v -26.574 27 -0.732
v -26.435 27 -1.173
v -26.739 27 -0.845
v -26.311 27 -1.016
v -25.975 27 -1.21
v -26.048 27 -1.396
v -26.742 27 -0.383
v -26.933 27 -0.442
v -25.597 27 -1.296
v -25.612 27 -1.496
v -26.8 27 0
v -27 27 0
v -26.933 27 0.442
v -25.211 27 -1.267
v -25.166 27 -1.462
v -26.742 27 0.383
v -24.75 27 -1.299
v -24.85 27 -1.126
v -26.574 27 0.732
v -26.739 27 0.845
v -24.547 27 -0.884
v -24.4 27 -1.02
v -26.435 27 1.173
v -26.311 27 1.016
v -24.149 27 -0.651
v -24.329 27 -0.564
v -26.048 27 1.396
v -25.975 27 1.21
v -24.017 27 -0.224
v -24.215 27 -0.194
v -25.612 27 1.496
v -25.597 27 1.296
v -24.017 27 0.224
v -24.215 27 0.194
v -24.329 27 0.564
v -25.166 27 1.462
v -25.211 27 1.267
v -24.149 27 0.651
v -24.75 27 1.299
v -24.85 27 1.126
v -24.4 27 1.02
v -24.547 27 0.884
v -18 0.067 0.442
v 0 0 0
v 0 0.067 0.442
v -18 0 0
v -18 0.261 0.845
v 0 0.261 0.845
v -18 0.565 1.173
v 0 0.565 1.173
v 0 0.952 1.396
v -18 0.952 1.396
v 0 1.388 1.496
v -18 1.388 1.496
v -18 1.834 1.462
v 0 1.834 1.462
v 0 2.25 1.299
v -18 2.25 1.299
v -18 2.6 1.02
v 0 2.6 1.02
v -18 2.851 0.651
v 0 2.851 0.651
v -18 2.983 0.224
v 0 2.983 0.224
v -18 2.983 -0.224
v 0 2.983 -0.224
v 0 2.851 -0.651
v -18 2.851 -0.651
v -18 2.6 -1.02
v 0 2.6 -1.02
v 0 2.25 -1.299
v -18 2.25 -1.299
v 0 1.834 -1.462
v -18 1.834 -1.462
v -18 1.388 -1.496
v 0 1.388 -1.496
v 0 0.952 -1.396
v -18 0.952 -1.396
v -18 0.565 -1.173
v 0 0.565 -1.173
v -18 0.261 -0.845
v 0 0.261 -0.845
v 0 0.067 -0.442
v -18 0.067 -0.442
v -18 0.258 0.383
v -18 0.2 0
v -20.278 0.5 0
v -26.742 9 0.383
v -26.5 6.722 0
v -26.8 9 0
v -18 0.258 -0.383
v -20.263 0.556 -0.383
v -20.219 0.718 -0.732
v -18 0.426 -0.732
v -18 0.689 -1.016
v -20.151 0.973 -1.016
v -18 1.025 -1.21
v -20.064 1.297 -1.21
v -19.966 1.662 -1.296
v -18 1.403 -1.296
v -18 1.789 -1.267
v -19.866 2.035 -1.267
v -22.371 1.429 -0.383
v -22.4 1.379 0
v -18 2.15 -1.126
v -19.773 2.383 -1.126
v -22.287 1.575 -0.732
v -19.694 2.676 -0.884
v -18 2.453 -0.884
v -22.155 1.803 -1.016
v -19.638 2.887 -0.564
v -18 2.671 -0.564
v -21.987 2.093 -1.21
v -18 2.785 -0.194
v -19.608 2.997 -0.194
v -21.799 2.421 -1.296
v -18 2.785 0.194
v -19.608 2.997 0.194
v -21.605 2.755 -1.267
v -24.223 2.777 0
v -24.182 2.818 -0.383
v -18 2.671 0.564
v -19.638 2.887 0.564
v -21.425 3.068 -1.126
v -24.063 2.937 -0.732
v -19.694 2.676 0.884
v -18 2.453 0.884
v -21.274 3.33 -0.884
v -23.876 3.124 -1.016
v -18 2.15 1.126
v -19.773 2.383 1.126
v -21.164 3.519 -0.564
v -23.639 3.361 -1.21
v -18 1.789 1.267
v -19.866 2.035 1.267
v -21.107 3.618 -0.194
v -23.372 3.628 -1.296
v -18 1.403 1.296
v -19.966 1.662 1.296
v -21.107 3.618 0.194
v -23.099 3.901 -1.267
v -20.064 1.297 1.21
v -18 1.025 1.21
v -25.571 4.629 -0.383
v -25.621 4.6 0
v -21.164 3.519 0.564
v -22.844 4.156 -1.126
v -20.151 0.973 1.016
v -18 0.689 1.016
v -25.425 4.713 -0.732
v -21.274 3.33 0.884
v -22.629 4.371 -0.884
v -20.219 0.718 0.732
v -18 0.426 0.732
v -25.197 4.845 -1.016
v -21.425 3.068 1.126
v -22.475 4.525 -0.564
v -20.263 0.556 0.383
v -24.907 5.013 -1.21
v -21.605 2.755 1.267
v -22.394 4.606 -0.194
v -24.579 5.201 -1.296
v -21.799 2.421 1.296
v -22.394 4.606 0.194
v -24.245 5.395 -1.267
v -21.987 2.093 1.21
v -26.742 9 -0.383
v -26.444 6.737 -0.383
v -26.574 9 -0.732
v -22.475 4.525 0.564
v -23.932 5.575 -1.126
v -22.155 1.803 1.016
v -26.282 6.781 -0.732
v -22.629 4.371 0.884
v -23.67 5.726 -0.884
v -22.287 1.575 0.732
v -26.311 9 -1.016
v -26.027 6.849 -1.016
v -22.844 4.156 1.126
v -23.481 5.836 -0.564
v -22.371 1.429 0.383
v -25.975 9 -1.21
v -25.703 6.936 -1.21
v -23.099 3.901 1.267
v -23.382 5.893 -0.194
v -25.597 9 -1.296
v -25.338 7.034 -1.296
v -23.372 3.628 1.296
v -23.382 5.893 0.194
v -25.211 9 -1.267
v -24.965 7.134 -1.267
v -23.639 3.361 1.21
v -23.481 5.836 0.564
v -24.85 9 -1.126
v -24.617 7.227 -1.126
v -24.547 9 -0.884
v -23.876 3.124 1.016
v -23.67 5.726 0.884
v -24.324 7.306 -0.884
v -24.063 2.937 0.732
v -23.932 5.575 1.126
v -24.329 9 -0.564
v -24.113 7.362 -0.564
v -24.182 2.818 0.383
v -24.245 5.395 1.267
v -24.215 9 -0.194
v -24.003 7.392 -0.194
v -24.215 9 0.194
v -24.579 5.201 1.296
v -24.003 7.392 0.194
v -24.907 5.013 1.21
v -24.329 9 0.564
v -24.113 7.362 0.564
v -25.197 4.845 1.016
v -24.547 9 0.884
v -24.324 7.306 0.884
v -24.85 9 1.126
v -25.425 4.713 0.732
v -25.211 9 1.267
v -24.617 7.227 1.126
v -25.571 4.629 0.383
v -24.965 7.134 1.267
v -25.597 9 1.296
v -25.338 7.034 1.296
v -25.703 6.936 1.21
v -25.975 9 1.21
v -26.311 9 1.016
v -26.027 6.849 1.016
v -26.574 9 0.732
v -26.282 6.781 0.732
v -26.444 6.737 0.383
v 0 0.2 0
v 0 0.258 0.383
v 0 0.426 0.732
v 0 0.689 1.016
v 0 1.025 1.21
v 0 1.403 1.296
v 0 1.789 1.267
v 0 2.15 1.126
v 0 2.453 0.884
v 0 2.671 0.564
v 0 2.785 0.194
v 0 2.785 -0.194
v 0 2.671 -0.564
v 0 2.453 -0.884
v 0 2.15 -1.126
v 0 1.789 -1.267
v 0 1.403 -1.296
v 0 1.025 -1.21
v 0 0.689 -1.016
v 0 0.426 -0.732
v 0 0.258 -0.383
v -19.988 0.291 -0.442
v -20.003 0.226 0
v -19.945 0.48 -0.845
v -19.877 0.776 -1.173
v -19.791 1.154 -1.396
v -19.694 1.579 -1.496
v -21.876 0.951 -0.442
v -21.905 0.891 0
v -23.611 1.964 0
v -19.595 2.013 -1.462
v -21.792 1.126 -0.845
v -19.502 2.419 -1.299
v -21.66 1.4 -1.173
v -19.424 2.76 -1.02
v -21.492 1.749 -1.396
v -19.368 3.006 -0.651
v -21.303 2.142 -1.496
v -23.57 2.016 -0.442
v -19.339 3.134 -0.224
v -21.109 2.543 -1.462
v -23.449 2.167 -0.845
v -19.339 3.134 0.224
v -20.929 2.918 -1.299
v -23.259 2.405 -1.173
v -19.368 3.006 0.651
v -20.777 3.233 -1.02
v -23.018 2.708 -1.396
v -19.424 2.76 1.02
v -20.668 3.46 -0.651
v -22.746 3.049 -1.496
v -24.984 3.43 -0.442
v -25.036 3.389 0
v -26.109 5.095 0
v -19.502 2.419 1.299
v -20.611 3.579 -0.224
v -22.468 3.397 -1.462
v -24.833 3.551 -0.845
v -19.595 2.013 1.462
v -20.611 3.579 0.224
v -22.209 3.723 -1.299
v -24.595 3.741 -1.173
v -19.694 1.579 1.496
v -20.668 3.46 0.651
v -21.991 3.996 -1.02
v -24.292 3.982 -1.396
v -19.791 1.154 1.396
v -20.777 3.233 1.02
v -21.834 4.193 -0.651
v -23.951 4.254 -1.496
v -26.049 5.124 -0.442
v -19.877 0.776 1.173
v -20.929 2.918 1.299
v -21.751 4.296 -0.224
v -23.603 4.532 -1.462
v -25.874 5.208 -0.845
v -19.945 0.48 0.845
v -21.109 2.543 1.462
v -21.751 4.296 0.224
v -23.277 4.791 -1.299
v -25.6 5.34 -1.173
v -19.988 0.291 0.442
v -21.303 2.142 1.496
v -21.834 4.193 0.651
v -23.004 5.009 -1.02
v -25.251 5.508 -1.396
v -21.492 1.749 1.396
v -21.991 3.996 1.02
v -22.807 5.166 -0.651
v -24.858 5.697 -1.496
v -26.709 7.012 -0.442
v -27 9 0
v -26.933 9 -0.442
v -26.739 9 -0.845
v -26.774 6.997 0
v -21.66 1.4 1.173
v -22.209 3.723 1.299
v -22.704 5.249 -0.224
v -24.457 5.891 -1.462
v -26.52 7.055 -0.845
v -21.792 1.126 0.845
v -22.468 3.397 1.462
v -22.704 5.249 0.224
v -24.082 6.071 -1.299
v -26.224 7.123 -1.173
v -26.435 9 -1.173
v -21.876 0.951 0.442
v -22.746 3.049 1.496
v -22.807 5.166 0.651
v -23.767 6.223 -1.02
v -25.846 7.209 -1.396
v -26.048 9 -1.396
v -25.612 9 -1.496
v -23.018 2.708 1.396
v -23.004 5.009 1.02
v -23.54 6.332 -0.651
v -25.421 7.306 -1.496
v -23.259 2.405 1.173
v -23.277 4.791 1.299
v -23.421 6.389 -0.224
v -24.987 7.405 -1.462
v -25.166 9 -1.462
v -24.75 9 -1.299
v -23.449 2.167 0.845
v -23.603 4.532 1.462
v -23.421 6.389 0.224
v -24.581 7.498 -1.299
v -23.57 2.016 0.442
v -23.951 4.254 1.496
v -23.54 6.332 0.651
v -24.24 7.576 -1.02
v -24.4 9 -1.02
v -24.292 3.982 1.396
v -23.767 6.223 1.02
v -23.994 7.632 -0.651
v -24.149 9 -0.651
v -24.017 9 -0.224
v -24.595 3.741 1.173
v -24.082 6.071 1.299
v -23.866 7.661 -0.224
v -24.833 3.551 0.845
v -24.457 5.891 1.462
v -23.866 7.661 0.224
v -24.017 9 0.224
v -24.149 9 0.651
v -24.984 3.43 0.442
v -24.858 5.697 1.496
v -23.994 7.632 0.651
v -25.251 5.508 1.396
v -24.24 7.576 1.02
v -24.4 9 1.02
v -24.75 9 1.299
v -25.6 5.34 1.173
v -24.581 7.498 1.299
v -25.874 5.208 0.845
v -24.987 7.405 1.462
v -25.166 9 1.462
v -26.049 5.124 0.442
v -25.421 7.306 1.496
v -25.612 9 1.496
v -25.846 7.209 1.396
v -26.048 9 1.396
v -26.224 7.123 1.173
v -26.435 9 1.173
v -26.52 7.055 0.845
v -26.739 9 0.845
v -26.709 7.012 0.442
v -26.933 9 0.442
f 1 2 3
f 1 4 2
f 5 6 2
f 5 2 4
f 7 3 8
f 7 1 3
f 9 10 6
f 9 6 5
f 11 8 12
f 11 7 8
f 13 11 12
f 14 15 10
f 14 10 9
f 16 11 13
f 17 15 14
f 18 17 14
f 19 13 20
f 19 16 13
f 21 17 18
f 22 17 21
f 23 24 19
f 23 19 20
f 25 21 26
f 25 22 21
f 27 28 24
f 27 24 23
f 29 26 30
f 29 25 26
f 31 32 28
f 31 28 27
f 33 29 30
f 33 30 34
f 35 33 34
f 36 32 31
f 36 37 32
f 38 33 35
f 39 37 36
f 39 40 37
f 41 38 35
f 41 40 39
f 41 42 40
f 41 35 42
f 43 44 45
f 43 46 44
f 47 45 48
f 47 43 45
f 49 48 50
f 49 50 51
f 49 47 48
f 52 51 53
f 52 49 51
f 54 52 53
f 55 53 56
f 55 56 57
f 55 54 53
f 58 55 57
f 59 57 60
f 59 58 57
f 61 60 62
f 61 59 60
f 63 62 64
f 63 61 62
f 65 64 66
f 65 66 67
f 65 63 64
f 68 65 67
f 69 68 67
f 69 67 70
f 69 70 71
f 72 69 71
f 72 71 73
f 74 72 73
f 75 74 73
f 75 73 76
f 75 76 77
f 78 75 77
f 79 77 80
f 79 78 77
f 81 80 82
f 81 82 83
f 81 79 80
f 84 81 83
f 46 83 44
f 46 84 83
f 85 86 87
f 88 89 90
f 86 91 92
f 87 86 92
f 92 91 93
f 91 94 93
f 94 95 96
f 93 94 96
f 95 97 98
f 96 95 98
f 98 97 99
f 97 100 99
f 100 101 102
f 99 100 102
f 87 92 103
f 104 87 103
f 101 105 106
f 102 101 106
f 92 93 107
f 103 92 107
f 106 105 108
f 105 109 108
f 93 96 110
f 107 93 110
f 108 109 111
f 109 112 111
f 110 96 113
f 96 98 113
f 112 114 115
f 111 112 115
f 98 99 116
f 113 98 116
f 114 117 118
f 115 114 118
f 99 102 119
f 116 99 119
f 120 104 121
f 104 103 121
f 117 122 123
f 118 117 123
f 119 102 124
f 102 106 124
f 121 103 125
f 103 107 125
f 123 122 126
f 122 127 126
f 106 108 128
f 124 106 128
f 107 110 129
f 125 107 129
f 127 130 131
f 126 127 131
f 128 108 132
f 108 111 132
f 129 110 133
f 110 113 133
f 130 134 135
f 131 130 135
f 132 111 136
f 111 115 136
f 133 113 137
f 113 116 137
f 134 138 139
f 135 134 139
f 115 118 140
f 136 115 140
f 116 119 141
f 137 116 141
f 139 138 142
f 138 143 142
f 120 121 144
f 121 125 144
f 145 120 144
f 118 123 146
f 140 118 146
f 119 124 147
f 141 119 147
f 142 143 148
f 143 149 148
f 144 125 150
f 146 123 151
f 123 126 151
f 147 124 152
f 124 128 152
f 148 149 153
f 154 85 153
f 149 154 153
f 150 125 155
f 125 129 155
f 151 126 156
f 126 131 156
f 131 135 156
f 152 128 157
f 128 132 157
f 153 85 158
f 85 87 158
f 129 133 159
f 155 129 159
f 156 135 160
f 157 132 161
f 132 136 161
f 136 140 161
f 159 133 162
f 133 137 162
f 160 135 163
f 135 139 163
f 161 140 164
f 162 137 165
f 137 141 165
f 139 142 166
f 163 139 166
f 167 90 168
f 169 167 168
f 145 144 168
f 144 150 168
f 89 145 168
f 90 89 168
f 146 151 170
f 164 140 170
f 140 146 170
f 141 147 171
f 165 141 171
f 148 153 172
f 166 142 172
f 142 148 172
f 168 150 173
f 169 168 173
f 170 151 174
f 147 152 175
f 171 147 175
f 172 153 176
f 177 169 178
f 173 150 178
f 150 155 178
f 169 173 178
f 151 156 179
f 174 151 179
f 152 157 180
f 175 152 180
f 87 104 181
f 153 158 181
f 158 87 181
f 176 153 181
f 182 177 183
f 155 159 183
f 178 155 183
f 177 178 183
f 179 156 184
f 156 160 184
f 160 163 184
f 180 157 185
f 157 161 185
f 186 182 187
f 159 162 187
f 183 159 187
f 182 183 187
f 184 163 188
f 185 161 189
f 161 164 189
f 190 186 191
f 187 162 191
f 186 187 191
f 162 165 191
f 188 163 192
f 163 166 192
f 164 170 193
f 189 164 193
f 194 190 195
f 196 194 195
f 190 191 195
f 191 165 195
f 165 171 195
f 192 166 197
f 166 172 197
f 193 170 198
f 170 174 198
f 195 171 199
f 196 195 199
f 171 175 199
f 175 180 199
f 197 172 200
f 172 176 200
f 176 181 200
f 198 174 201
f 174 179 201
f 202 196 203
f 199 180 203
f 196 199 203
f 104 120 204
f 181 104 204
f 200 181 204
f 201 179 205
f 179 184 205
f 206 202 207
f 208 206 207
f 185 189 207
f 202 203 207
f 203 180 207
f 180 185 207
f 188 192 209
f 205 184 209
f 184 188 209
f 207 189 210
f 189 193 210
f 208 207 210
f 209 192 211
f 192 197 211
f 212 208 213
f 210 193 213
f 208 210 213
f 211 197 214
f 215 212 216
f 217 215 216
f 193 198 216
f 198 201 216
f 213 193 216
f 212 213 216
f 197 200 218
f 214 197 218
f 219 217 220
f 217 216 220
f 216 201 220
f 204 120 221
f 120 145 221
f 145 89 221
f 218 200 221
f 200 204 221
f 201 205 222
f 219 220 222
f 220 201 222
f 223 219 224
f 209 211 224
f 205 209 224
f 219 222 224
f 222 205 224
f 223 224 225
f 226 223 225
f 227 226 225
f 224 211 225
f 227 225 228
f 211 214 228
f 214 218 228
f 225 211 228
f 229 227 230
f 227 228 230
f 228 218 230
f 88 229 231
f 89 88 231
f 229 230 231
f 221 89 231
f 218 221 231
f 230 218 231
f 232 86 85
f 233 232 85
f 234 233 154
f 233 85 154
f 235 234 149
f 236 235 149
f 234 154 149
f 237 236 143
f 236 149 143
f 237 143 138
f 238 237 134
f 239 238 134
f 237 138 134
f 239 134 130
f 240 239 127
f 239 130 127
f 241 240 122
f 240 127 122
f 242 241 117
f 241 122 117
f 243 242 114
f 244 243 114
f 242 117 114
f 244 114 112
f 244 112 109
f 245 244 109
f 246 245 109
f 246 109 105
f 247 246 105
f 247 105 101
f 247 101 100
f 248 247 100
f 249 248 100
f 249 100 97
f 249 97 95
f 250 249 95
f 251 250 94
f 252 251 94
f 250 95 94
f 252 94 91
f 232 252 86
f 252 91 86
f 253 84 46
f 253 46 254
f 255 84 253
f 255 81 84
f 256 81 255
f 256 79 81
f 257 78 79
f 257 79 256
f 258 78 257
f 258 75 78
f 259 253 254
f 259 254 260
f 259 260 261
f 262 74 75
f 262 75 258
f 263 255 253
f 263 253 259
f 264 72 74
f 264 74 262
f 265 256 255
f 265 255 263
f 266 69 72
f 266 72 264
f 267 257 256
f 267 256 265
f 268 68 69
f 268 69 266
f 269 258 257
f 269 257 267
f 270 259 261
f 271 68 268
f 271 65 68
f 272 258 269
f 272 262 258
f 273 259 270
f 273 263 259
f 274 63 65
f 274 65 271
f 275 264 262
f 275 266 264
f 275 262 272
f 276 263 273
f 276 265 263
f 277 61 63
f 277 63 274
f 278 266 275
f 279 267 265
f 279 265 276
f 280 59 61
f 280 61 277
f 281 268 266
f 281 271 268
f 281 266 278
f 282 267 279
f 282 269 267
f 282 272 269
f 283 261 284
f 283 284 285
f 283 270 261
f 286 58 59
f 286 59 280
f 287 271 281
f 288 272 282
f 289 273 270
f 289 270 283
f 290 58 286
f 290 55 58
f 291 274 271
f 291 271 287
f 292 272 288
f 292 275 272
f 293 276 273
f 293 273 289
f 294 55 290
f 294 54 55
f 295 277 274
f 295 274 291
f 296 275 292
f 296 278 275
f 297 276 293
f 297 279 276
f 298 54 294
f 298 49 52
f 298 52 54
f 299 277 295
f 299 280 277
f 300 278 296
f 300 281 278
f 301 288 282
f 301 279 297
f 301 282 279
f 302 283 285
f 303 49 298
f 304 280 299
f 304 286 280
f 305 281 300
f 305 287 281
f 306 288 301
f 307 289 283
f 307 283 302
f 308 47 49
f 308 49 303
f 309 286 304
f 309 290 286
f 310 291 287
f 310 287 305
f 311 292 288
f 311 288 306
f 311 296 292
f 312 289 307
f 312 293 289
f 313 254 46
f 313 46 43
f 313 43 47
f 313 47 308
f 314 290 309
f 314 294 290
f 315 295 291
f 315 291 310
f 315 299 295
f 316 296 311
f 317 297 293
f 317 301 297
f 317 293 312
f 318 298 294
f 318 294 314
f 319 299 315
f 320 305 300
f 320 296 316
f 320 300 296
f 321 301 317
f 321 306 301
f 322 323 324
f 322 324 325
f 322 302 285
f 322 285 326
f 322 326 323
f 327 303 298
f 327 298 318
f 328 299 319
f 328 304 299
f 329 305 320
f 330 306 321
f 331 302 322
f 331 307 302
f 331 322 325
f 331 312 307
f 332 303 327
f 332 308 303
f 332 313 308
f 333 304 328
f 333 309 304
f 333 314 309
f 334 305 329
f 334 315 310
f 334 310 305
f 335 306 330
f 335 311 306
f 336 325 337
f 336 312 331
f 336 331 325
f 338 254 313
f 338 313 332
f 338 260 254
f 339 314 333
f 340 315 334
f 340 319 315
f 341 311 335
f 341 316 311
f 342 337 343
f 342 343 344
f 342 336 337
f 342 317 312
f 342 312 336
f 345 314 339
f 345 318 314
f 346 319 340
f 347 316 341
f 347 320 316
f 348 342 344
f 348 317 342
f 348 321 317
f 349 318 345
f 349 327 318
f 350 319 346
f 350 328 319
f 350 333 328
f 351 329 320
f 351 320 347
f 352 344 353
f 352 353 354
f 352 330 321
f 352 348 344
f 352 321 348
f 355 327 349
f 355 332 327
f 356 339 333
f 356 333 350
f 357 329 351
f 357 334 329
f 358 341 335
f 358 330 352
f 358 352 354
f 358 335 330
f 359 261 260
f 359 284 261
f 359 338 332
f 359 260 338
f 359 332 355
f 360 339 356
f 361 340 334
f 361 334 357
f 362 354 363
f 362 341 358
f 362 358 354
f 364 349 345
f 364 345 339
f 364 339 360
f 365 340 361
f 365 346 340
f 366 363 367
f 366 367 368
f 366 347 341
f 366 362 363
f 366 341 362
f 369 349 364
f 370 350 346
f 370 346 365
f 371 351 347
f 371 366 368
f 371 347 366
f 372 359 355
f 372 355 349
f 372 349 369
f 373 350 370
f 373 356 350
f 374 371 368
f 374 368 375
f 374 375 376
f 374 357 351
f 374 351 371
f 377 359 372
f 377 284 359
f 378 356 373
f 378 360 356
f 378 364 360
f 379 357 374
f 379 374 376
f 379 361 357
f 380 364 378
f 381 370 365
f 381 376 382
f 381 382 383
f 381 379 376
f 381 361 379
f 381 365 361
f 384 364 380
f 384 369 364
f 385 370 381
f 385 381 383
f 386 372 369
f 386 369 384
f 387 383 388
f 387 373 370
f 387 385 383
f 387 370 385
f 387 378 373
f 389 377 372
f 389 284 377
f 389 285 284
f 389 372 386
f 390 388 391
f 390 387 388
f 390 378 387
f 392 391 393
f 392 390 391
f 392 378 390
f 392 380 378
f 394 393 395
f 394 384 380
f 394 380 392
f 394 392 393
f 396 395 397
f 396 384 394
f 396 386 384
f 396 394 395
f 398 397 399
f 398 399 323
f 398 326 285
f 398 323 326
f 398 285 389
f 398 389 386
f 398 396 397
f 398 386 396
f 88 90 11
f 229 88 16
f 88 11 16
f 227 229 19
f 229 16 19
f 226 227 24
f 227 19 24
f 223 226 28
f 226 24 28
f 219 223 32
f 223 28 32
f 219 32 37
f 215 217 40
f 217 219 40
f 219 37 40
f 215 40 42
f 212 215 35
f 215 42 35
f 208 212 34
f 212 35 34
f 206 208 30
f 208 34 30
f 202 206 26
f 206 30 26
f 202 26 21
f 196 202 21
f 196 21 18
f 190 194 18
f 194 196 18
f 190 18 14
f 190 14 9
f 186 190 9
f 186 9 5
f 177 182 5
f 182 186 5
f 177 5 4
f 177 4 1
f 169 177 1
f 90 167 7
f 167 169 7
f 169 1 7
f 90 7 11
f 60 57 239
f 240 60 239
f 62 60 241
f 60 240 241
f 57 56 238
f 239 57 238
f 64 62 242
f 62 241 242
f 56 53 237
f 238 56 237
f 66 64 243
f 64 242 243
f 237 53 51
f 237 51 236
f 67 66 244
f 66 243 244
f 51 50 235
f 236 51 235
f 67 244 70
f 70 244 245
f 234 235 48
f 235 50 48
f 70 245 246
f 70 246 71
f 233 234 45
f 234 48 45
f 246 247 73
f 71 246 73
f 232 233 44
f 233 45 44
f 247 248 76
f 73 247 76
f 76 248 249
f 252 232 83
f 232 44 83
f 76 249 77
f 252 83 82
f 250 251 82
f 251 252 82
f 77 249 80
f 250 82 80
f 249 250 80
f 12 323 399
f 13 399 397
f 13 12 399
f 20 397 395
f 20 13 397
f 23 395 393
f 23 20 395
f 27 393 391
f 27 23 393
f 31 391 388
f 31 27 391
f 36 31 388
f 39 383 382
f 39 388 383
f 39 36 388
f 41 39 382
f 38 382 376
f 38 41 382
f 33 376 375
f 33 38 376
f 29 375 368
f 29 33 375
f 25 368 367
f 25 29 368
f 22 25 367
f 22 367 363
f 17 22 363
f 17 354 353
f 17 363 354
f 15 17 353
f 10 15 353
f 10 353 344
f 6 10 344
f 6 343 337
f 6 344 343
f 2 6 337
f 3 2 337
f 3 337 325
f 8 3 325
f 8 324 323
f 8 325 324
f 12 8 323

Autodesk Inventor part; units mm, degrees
ref_plane "YZ Plane" through (0, 0, 0) normal (1, 0, 0) x (0, 1, 0)
ref_plane "XY Plane" through (0, 0, 0) normal (0, 0, 1) x (1, 0, 0)
sketch "Sketch1" plane through (0, 0, 0) normal (0, 0, 1) x (1, 0, 0)
  line L0 (0, 0) -> (-27, 0)
  line L1 (-27, 0) -> (-27, 27)
  arc A0 (-24, 9) -> (-18, 3) centre (-18, 9) ccw
  arc A1 (-27, 9) -> (-18, 0) centre (-18, 9) ccw
  line L2 (0, 3) -> (-18, 3)
  line L3 (-24, 9) -> (-24, 27)
  line L4 (0, 0) -> (0, 3)
  line L5 (-27, 27) -> (-24, 27)
  line L6 (-25.5, 9) -> (-25.5, 27)
  line L7 (-18, 1.5) -> (0, 1.5)
  arc A2 (-25.5, 9) -> (-18, 1.5) centre (-18, 9) ccw
  line L8 (-24, 9) -> (-27, 9)
  line L9 (-18, 3) -> (-18, 0)
  dimension "d0" = 27
  dimension "d1" = 27
  dimension "d2" = 6
  dimension "d3" = 9
sketch "Sketch2" plane through (0, 0, 0) normal (1, 0, 0) x (0, 1, 0)
  circle A0 centre (1.5, 0) radius 1.5
  line L0 (0, 5.6966) -> (0, -5.6966) construction
  line L1 (3, 0) -> (-1.1636, 0) construction
  point P0 (0, 0)
  point P1 (0, 0)
  dimension "d5" = 3
  dimension "d6" = 1.5
ref_plane "Work Plane1" through (0, 27, 0) normal (0, 1, 0) x (-1, 0, 0)
sketch "Sketch3" plane through (0, 27, 0) normal (0, 1, 0) x (-1, 0, 0)
  circle A0 centre (25.5, 0) radius 1.5
  line L0 (27, 6.8213) -> (27, -6.8213) construction
  line L1 (30.5412, 0) -> (-1.145, 0) construction
  point P0 (0, 0)
  point P1 (27, 0)
  dimension "d8" = 3
  dimension "d9" = 27
  dimension "d10" = 25.5
sweep "Sweep1" add profiles "Sketch3" path "Sketch1" path curves L6 A2 L7
shell "Shell1" thickness 0.2 removed faces 2 at (0, 1.8952, 0.8627) at (-25.3633, 27, 0.3027)
properties part number "Hudson 1-70"
